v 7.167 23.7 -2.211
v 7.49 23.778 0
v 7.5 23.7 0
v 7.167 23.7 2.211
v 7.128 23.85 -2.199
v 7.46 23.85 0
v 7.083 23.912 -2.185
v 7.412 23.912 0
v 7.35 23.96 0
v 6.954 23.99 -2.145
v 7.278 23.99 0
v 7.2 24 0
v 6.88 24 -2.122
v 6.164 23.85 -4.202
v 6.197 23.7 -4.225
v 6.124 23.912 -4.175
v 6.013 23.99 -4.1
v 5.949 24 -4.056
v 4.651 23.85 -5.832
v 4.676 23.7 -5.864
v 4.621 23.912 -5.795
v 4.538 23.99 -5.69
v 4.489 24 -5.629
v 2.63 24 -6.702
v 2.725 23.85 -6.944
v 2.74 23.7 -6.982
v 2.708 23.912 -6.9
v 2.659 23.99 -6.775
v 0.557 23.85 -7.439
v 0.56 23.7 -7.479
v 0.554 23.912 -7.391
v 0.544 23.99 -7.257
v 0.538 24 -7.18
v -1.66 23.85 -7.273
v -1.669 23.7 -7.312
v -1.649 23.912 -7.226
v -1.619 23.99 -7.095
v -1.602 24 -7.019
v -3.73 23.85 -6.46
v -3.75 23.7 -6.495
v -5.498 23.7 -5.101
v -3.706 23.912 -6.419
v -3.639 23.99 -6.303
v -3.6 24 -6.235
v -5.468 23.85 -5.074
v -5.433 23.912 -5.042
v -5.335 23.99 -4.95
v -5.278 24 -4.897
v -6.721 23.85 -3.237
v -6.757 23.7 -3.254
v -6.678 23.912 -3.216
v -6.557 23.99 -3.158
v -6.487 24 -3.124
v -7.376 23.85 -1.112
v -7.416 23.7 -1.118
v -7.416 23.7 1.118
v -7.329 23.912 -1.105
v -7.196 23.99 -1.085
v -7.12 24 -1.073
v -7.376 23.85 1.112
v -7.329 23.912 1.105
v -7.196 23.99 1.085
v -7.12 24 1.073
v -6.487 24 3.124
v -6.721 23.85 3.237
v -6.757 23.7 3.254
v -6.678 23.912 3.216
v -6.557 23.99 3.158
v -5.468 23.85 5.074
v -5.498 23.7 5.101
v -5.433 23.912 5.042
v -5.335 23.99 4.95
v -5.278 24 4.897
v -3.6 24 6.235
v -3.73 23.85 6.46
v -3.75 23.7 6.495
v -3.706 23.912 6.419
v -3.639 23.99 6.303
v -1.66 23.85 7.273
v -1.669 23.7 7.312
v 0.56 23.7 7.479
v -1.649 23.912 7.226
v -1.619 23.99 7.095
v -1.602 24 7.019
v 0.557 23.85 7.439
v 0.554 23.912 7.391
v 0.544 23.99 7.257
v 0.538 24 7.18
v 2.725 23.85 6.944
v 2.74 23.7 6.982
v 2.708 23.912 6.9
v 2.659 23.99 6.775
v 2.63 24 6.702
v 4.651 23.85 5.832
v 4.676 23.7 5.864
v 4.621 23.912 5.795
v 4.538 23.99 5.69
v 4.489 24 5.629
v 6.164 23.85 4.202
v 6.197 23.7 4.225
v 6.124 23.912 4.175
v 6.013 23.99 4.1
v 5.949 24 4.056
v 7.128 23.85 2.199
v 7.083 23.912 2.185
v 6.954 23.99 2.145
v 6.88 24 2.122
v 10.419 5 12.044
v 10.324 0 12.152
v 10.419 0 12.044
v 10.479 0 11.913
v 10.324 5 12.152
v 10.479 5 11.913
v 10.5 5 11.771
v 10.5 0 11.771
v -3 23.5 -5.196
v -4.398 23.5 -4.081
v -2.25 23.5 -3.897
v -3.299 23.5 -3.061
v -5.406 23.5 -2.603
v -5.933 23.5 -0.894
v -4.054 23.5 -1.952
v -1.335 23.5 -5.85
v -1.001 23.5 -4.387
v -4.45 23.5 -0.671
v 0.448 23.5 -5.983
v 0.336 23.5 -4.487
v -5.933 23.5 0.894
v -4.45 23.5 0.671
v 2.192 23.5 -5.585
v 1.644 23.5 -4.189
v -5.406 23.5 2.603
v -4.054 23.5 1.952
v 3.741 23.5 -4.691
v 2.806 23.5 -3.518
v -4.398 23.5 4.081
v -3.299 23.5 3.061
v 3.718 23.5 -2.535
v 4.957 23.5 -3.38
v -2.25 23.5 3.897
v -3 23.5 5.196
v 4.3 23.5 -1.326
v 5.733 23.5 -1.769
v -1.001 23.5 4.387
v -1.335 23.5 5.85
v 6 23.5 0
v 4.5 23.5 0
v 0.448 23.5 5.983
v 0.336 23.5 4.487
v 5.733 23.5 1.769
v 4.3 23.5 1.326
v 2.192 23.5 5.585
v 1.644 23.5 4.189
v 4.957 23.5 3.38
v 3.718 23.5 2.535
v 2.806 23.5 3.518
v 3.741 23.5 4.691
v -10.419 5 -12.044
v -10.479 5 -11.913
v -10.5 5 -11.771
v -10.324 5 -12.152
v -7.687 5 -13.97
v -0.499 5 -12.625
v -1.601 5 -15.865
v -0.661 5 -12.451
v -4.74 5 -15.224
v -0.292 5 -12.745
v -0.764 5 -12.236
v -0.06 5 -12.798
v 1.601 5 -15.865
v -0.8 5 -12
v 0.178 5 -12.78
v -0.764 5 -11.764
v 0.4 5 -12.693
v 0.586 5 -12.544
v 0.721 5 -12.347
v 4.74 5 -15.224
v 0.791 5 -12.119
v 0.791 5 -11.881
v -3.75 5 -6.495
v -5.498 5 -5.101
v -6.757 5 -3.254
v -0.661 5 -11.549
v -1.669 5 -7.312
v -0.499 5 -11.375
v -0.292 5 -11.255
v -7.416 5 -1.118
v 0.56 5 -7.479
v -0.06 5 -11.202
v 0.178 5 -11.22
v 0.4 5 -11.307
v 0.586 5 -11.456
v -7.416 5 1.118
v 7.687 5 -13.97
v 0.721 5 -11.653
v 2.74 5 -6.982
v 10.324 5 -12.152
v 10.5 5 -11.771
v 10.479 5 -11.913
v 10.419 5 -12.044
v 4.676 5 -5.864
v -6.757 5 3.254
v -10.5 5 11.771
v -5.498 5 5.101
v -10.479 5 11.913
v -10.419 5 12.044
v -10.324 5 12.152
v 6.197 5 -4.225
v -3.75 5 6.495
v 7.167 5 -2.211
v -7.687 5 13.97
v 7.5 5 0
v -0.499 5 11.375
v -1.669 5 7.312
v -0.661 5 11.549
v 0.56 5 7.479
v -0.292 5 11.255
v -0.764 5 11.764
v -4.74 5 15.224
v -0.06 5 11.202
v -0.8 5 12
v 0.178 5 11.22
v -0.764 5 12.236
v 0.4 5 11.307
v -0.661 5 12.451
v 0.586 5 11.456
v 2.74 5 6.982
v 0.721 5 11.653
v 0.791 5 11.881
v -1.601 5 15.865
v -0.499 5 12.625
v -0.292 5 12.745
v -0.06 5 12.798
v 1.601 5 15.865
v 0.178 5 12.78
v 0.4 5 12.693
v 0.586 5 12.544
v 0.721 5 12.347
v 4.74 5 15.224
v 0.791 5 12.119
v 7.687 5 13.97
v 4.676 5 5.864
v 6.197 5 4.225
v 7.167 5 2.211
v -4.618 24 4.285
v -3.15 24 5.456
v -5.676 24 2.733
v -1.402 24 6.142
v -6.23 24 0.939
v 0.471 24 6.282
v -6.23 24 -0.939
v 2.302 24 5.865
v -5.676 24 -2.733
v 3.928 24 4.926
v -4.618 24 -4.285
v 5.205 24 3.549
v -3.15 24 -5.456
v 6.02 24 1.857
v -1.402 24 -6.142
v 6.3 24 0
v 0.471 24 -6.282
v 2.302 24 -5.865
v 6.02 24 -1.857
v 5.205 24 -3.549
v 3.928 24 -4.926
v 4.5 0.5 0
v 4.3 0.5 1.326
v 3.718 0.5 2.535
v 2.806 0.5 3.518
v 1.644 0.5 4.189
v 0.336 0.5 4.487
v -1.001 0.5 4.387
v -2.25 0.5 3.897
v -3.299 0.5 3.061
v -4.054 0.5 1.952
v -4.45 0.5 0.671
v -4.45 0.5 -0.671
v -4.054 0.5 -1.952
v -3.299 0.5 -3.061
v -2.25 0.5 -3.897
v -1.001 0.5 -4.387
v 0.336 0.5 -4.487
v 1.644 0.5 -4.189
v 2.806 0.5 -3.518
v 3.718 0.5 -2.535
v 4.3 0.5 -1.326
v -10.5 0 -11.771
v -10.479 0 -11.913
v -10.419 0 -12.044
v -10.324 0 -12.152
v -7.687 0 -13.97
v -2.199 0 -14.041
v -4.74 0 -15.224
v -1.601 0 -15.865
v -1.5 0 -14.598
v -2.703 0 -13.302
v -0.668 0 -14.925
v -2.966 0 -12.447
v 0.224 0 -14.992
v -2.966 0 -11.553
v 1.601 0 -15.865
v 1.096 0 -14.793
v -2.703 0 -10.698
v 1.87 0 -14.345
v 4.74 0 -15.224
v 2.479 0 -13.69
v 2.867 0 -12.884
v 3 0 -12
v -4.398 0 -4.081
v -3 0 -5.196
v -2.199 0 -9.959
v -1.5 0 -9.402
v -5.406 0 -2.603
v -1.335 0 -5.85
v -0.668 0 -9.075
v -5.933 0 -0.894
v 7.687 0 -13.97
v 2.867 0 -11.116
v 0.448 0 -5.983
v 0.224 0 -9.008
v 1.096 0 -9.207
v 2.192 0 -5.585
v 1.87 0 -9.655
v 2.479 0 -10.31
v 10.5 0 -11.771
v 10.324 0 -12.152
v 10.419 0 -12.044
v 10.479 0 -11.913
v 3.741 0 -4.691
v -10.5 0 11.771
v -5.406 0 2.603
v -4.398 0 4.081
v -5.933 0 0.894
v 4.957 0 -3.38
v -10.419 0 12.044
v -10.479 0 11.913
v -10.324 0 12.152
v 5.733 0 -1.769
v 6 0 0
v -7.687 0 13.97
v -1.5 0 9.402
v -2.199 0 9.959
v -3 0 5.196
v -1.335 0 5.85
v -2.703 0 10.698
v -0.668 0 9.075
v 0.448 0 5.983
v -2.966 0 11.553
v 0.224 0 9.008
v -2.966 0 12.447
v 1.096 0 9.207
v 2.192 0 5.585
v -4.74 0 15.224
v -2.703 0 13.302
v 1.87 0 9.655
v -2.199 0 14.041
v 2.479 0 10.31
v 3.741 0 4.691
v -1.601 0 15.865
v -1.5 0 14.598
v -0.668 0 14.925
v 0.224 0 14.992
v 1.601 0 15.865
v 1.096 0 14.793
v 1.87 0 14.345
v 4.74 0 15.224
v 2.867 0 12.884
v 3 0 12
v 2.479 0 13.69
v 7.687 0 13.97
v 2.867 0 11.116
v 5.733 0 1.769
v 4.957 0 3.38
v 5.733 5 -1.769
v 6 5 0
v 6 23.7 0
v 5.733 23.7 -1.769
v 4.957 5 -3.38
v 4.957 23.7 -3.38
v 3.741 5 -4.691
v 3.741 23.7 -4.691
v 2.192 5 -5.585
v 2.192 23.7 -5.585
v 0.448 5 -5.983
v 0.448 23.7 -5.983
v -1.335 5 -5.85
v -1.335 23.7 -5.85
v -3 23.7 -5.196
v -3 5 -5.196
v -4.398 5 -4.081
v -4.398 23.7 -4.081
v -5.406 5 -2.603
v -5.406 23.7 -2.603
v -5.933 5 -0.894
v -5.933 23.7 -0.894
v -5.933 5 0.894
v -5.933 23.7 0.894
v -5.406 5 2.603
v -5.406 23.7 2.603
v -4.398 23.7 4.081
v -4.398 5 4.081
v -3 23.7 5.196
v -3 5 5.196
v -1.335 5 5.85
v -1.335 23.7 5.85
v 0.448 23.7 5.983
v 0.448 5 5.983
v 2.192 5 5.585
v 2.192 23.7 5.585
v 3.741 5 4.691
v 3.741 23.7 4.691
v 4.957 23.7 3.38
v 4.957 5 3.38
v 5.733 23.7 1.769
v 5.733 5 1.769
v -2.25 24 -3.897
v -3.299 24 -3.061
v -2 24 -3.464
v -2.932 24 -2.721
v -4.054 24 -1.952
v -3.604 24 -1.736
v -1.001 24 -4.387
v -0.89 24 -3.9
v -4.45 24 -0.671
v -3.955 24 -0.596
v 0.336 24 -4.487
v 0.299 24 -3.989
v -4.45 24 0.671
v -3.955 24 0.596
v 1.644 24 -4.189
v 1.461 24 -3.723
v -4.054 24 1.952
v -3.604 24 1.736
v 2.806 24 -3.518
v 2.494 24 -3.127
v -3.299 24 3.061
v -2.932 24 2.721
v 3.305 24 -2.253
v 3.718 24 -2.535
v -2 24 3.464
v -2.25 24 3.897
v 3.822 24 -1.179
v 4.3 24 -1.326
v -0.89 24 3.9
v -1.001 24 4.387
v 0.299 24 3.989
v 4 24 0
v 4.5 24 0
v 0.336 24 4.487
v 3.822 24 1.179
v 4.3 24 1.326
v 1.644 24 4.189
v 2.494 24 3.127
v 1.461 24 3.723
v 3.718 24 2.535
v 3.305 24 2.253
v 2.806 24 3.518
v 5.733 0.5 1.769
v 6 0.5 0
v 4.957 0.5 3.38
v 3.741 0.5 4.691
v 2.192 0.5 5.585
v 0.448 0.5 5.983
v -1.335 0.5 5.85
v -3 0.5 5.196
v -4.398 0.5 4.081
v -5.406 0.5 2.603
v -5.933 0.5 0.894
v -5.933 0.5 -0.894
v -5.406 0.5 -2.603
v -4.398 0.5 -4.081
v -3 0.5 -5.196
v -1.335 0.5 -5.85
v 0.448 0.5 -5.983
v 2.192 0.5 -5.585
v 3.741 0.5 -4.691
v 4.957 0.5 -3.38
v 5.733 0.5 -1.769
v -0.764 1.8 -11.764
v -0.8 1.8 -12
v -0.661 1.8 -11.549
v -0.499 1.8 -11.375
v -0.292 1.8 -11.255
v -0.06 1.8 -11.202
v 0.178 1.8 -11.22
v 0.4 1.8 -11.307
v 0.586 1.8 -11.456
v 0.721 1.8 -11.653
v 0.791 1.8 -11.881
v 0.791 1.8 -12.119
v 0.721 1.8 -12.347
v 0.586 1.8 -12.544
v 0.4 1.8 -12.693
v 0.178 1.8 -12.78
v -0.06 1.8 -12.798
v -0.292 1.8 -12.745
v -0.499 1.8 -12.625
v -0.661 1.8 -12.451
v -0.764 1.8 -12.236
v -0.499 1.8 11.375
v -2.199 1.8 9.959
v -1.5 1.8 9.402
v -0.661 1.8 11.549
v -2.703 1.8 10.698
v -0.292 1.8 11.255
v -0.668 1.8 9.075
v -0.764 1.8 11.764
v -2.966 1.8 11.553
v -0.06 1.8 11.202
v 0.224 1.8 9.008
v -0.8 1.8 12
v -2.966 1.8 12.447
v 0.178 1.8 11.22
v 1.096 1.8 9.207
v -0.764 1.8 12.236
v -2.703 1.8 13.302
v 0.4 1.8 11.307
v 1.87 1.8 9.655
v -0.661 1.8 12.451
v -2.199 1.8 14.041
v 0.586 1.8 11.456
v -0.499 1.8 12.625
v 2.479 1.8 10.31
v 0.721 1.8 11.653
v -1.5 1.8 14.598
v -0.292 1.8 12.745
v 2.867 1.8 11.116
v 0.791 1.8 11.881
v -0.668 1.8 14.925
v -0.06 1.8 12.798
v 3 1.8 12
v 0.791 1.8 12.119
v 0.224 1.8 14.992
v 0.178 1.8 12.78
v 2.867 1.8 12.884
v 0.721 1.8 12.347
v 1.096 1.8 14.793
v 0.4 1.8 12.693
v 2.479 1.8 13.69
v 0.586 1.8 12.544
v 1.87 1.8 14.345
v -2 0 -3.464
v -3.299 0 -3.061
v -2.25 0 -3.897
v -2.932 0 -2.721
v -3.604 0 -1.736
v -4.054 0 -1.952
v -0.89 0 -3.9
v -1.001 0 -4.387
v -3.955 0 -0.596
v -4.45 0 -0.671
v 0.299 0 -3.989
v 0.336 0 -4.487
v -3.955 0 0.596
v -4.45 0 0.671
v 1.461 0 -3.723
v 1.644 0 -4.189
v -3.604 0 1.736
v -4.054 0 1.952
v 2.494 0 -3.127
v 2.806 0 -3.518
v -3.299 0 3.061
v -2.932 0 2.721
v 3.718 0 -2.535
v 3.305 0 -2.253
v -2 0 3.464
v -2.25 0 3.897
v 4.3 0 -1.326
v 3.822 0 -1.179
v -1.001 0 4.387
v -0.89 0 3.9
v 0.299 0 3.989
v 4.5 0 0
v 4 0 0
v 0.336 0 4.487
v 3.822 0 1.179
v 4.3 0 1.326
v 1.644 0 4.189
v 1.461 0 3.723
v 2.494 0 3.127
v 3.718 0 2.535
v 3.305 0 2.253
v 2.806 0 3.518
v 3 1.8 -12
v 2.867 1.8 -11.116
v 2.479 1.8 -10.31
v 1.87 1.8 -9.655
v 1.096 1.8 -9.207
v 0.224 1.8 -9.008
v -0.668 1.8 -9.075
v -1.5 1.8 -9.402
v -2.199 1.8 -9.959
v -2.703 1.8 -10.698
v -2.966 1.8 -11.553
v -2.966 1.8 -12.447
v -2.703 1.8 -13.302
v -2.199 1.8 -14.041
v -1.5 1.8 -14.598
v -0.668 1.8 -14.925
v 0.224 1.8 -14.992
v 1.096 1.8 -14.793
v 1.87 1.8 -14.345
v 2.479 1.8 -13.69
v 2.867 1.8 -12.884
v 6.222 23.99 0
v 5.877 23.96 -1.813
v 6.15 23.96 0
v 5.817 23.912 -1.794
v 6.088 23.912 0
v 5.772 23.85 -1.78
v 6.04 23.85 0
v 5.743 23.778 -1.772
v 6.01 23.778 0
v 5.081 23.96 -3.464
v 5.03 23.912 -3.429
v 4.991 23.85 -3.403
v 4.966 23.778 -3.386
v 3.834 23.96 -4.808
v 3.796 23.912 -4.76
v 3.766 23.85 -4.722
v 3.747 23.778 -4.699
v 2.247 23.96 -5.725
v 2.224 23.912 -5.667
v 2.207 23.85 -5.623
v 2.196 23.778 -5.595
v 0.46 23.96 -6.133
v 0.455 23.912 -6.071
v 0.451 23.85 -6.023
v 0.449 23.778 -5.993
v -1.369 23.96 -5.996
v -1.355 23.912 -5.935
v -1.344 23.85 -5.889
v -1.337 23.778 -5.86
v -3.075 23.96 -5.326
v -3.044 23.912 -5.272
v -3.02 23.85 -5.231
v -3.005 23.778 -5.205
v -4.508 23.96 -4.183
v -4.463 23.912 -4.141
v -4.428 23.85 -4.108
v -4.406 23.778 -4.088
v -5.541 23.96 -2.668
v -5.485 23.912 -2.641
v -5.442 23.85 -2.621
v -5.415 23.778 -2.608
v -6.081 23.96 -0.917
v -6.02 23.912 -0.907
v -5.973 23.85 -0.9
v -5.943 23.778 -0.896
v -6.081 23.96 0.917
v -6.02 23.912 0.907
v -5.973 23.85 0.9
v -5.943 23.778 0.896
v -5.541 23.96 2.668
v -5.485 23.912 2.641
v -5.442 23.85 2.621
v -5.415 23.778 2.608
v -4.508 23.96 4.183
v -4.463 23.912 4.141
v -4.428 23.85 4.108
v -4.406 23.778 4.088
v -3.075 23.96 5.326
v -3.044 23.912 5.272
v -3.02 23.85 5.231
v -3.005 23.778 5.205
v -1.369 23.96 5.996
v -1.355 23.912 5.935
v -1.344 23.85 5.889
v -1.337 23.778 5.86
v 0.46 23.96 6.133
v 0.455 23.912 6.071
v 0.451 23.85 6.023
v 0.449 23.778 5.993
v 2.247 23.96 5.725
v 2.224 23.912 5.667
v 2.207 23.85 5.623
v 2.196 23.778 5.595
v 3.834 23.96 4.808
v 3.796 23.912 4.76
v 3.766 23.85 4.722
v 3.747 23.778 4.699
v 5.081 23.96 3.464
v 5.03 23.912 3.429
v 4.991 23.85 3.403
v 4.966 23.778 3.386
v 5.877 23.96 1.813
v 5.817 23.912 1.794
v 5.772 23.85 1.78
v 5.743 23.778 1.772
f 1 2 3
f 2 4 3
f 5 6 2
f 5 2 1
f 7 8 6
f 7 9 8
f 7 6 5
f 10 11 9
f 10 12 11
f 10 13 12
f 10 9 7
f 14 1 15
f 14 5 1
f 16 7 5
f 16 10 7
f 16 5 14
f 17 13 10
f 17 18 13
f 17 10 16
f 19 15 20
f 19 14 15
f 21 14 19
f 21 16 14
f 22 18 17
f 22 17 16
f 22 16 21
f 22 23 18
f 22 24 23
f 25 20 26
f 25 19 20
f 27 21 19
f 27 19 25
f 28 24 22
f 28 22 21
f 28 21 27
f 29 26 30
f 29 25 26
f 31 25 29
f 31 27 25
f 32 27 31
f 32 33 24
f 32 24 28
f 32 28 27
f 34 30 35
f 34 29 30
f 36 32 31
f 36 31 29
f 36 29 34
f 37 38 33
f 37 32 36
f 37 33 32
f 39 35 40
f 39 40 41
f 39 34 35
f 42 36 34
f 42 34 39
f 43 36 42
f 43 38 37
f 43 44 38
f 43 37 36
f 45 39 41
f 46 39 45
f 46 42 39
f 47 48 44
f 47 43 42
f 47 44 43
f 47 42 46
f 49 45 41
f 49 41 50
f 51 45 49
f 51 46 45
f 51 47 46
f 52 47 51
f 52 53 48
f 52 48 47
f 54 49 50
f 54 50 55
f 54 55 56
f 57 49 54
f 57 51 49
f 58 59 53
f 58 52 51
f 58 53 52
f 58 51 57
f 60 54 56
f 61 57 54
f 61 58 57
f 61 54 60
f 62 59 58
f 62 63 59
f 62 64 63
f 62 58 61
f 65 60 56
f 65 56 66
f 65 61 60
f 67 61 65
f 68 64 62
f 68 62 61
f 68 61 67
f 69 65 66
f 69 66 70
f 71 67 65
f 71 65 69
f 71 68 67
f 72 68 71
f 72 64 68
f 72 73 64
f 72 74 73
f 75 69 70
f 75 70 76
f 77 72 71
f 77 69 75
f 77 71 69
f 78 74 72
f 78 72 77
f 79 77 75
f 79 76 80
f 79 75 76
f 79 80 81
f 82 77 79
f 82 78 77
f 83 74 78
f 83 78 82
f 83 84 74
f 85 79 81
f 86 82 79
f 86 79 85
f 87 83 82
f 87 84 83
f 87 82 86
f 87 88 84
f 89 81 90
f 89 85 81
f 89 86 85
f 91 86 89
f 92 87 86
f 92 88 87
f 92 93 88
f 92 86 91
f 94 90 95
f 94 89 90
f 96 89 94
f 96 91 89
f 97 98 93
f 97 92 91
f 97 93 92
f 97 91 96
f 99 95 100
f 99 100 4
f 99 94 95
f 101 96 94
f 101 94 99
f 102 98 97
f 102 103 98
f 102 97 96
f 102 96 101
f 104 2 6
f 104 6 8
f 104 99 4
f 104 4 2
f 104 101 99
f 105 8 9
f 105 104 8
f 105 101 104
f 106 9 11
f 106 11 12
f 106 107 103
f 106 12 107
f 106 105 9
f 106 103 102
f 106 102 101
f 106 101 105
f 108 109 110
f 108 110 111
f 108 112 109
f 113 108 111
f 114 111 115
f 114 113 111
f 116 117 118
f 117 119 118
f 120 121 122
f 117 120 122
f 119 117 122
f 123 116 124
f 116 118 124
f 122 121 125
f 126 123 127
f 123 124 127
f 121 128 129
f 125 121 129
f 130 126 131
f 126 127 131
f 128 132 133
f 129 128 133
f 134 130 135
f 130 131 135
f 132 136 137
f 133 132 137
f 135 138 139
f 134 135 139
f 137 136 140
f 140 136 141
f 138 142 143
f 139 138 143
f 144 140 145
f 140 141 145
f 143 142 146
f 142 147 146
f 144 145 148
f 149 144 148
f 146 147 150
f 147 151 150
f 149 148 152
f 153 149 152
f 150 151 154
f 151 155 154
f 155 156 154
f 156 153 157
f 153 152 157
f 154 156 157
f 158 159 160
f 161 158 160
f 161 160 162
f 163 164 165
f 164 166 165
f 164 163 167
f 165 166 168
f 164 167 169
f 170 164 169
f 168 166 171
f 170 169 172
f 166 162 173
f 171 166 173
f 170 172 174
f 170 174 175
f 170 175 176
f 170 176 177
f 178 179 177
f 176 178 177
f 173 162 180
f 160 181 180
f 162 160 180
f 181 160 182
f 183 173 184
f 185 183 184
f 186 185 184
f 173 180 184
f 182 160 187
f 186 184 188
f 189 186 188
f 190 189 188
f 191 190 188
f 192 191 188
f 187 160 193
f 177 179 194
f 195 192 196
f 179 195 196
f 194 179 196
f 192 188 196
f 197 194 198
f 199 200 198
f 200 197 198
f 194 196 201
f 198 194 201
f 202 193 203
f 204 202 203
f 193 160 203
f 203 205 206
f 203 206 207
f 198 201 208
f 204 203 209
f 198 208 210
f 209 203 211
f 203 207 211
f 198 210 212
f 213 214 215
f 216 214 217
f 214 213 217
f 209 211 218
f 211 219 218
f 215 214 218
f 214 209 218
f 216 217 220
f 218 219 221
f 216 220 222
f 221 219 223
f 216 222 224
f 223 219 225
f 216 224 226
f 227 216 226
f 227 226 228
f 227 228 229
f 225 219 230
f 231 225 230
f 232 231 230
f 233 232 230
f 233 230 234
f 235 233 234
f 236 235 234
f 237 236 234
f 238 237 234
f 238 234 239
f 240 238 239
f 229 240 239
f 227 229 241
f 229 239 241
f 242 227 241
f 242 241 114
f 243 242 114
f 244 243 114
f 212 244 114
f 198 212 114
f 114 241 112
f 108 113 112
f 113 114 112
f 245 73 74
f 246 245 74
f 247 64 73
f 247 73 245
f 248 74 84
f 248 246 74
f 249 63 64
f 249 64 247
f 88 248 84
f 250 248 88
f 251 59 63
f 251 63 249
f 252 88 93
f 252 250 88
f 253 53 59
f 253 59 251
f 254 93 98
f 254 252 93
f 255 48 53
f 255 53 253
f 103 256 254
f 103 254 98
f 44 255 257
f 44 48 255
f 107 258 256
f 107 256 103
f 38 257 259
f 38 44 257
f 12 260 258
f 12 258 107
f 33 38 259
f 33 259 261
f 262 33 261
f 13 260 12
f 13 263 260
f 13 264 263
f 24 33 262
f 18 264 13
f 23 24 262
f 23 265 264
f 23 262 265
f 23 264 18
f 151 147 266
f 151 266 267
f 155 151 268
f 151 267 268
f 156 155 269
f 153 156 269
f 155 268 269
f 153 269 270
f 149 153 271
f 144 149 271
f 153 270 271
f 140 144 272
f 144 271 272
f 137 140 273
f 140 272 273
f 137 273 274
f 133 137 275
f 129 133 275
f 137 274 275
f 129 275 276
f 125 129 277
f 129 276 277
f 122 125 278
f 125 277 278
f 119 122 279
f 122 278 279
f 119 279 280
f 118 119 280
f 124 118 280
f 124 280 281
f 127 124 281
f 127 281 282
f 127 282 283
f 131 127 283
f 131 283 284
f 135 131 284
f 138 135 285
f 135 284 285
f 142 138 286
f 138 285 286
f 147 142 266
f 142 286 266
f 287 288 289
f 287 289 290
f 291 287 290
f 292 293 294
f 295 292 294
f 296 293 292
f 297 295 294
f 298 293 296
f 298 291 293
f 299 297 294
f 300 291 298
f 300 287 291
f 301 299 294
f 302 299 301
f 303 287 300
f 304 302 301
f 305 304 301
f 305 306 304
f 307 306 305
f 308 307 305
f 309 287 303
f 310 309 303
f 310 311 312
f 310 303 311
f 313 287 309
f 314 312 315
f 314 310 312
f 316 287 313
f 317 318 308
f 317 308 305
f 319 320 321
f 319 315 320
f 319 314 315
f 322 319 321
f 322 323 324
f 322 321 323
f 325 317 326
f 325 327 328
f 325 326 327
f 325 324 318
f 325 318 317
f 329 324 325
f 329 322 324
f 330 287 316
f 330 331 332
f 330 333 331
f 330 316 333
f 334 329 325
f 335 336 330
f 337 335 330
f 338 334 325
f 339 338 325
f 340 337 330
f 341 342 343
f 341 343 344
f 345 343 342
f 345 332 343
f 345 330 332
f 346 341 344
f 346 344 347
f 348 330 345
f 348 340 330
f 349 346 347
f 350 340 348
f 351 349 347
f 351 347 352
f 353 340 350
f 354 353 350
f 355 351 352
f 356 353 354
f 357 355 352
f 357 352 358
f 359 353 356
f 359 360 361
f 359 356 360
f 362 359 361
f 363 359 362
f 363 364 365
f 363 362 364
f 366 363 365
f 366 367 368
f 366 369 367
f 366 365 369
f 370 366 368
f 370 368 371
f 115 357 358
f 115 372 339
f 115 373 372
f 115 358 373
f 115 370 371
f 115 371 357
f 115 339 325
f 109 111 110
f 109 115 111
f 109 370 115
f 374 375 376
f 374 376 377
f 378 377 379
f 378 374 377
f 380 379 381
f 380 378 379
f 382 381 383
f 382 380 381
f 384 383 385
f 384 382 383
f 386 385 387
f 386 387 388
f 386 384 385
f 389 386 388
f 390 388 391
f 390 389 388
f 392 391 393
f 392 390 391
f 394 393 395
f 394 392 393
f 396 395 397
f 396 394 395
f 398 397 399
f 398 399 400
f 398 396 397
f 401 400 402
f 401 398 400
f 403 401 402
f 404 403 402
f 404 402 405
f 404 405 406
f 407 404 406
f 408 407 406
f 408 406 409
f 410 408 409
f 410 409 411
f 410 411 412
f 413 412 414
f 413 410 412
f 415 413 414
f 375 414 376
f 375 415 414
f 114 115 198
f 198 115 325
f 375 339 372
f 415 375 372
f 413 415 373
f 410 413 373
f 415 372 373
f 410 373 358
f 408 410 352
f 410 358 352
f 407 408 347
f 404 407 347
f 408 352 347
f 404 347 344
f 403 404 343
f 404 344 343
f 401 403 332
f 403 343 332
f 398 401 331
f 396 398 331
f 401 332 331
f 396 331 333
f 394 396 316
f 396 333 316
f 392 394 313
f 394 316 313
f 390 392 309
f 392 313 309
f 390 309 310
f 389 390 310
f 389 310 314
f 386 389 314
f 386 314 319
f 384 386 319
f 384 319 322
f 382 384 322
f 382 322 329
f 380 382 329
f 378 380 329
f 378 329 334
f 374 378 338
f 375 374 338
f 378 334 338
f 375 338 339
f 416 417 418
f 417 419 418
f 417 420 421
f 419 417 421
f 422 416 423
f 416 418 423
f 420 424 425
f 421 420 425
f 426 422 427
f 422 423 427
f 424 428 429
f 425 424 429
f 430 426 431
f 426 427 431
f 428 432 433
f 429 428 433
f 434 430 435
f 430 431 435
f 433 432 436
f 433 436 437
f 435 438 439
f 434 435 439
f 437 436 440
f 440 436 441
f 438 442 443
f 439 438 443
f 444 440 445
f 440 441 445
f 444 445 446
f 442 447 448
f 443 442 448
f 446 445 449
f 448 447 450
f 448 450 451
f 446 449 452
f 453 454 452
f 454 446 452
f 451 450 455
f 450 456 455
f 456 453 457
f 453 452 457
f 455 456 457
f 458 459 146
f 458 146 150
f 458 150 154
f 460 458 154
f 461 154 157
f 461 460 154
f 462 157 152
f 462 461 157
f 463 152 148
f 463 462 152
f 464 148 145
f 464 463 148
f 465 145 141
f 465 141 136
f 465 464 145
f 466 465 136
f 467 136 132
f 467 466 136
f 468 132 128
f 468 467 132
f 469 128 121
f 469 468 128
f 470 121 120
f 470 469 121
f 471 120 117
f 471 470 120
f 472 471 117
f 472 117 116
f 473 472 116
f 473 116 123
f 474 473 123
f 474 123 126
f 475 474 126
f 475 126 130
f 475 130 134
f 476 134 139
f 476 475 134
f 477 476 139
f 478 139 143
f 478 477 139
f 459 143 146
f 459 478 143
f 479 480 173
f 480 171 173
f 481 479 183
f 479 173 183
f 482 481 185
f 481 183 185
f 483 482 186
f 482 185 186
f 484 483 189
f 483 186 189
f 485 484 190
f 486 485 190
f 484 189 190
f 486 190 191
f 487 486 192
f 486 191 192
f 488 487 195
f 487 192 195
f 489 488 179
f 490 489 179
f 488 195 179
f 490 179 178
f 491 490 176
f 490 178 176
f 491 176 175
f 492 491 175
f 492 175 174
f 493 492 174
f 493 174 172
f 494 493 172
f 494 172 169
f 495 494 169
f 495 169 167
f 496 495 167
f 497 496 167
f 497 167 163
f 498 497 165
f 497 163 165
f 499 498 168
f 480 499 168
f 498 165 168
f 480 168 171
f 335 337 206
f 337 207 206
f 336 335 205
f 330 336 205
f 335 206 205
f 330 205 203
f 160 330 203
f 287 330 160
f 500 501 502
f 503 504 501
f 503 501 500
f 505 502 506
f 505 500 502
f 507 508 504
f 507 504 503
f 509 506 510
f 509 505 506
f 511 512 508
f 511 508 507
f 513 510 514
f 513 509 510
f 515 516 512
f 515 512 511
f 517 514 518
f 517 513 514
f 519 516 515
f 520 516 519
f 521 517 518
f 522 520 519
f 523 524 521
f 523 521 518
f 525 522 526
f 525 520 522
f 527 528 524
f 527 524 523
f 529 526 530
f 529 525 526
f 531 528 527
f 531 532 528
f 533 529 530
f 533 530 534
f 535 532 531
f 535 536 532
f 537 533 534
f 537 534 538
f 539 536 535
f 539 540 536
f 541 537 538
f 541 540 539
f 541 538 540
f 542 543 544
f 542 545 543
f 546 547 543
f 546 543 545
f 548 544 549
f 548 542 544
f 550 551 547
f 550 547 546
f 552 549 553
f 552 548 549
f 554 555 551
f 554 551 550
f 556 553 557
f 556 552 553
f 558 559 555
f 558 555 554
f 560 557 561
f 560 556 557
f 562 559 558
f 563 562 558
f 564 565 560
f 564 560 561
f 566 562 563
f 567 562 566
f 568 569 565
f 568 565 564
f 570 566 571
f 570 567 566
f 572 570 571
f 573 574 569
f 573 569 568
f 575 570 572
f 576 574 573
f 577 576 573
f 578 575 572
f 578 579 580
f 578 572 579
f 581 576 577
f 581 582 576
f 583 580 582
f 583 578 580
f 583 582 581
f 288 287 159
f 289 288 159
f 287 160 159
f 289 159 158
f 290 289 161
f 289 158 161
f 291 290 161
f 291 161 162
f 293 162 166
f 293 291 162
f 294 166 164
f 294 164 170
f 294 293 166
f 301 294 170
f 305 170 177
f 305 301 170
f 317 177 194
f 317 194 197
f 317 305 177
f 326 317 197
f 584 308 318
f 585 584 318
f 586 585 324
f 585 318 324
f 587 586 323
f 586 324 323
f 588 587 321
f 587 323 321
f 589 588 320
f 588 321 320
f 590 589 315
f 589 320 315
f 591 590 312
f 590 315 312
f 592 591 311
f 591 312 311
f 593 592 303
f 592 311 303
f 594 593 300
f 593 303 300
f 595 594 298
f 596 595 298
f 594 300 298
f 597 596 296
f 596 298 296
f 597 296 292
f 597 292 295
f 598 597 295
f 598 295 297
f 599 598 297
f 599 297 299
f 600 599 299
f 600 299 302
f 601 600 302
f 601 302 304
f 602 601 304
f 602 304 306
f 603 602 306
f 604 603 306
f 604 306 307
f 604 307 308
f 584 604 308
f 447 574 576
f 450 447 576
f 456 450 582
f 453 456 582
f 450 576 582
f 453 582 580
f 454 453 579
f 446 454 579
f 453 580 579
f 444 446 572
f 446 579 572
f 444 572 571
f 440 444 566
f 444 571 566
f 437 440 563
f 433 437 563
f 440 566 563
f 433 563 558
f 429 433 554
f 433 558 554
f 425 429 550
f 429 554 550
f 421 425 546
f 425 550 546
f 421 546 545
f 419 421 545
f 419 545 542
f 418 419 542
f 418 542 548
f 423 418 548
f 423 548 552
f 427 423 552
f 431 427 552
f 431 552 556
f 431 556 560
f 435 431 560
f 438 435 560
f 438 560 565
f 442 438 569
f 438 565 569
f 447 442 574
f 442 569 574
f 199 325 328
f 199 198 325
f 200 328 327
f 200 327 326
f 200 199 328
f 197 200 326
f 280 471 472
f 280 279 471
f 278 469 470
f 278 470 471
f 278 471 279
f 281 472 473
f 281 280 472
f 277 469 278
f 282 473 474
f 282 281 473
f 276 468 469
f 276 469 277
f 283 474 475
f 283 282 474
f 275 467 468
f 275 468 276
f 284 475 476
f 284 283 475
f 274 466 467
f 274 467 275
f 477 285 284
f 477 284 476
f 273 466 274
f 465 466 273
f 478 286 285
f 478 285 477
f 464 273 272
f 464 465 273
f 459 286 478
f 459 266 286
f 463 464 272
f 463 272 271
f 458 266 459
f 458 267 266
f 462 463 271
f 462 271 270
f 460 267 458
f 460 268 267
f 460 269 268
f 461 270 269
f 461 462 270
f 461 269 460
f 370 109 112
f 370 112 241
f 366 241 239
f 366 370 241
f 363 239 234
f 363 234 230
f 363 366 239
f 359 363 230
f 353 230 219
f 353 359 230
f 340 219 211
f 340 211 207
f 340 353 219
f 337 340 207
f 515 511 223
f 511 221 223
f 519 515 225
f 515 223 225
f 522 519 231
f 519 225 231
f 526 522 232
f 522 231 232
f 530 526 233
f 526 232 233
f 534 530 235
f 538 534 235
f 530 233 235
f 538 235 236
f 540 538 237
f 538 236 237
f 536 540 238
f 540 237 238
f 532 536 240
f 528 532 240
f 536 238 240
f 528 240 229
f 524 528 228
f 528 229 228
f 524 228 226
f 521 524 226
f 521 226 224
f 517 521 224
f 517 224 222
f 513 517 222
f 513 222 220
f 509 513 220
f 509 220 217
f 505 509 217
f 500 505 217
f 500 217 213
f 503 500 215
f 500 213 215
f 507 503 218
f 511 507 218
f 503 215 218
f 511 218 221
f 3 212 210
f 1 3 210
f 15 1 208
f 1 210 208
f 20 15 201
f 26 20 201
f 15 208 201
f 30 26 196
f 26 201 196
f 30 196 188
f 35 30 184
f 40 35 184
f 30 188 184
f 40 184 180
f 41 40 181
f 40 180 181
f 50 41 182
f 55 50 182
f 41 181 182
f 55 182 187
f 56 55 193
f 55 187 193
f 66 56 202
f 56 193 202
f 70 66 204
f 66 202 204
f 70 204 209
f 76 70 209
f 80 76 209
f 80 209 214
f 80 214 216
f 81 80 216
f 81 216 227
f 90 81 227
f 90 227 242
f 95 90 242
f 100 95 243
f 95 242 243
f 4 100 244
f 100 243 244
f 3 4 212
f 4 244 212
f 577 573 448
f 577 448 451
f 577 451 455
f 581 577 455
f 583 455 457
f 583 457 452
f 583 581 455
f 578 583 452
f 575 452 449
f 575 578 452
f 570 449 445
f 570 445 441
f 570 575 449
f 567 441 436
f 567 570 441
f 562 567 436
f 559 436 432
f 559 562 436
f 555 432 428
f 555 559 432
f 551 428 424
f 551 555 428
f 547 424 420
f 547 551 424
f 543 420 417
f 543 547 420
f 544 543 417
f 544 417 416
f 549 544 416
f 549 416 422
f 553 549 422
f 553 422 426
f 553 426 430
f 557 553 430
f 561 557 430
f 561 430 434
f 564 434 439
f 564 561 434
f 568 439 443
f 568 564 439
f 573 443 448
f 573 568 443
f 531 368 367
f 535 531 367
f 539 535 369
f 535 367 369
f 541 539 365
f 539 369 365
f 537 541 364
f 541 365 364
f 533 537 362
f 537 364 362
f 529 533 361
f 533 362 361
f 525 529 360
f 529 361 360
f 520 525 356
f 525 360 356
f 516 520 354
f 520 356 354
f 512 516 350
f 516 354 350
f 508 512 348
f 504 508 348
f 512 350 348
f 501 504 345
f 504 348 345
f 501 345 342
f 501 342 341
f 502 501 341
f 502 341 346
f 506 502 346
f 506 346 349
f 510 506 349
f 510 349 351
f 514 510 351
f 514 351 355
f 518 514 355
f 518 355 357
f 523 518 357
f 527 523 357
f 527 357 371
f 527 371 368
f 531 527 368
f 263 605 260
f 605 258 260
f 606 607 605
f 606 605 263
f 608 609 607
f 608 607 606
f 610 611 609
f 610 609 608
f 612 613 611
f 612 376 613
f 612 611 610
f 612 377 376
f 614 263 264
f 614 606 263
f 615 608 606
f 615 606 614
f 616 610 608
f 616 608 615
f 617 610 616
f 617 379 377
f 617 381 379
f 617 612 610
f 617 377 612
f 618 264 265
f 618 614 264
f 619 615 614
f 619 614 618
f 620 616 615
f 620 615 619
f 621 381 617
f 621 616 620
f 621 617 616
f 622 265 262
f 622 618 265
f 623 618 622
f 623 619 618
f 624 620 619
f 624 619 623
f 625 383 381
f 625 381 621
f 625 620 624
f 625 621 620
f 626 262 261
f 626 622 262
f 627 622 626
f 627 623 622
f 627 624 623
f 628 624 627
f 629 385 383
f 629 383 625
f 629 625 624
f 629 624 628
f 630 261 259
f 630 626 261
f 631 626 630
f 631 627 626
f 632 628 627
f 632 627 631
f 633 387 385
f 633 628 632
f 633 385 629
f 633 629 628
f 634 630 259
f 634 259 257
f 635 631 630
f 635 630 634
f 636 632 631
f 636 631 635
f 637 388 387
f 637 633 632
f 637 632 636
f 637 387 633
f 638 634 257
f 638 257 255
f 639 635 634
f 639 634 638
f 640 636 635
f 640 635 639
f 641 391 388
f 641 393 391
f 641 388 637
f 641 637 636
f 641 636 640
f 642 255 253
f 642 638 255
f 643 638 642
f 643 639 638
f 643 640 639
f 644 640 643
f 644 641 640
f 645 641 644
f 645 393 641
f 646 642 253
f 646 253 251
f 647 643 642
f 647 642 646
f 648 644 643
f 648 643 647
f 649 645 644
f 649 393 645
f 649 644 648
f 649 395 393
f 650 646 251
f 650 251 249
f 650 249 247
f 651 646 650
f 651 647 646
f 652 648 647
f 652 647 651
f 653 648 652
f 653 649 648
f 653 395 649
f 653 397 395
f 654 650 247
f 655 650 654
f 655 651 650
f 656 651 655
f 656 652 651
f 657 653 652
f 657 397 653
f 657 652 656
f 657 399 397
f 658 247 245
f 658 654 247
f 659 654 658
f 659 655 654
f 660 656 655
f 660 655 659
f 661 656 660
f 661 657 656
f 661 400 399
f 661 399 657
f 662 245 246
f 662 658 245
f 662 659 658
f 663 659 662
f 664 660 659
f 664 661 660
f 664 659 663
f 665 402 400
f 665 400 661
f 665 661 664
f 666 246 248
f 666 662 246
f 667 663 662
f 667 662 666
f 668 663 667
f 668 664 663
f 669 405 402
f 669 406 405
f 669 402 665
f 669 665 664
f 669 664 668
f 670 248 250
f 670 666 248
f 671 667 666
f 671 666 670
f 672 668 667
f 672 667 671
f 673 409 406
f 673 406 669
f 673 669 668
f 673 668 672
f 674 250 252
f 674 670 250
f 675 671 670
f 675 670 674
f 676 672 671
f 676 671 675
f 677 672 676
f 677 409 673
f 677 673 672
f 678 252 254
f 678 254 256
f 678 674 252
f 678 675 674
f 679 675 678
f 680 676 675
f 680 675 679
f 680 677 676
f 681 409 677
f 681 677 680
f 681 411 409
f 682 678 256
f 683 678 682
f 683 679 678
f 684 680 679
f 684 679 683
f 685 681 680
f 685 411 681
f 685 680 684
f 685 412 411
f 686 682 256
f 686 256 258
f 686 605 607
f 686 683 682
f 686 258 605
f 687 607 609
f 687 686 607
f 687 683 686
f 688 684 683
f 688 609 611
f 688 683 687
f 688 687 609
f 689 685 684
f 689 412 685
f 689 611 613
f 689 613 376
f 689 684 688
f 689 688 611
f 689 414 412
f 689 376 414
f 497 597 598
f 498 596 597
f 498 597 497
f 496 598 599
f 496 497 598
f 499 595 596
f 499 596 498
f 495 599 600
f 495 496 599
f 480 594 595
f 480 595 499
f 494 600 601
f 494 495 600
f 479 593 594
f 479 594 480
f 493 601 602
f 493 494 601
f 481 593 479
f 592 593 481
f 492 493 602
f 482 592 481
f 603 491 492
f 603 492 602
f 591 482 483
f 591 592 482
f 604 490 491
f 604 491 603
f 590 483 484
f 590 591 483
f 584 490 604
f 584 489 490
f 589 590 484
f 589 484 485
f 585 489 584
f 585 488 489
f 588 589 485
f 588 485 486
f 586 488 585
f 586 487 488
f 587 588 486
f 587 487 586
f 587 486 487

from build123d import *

# Parameters (mm, degrees)
SKETCH_R         = 6
PAD_DEPTH        = 5
HOLE_D           = 1.6
HOLE_CBORE_D     = 6
HOLE_CBORE_DEPTH = 1.8
SKETCH002_R      = 7.5
SKETCH002_R_2    = 6
PAD001_DEPTH     = 19
FILLET_R         = 0.5
FILLET001_R      = 0.3
SKETCH003_R      = 6
SKETCH003_R_2    = 4.5
PAD002_DEPTH     = 23
SKETCH004_R      = 4.5
SKETCH004_R_2    = 4
PAD003_DEPTH     = 24


with BuildPart() as body:
    # Sketch → Pad (new body)
    with BuildSketch(Plane.XZ):
        with BuildLine():
            ThreePointArc((10.5, 12), (0, 15.945219), (-10.5, 12))
            Line((-10.5, 12), (-10.5, -12))
            ThreePointArc((-10.5, -12), (0, -15.945219), (10.5, -12))
            Line((10.5, 12), (10.5, -12))
        make_face()
        Circle(SKETCH_R, mode=Mode.SUBTRACT)
    extrude(amount=-PAD_DEPTH)

    # Hole (through all)
    with Locations(Plane.XZ):
        with Locations((0, 12), (0, -12)):
            CounterBoreHole(HOLE_D / 2, HOLE_CBORE_D / 2, HOLE_CBORE_DEPTH)

    # Sketch002 (on Face5 of Hole) → Pad001 (join)
    with BuildSketch(Plane(origin=(0, 5, 0), x_dir=(1, 0, 0), z_dir=(0, 1, 0))):
        Circle(SKETCH002_R)
        Circle(SKETCH002_R_2, mode=Mode.SUBTRACT)
    extrude(amount=PAD001_DEPTH)

    # Fillet
    fillet_edges = [body.edges().sort_by_distance(p)[0] for p in [
        (10.5, 2.5, -12),
        (10.5, 2.5, 12),
        (-10.5, 2.5, 12),
        (-10.5, 2.5, -12),
    ]]
    fillet(fillet_edges, radius=FILLET_R)

    # Fillet001
    fillet001_edges = [body.edges().sort_by_distance(p)[0] for p in [
        (-7.5, 24, 0),
        (-6, 24, 0),
    ]]
    fillet(fillet001_edges, radius=FILLET001_R)


with BuildPart() as body001:
    # Sketch003 → Pad002 (new body)
    with BuildSketch(Plane.XZ):
        Circle(SKETCH003_R)
        Circle(SKETCH003_R_2, mode=Mode.SUBTRACT)
    extrude(amount=-PAD002_DEPTH)


with BuildPart() as body001_1:
    # Body001 placement: moved
    add(body001.part.moved(Location((0, 0.5, 0))))


with BuildPart() as body002:
    # Sketch004 → Pad003 (new body)
    with BuildSketch(Plane.XZ):
        Circle(SKETCH004_R)
        Circle(SKETCH004_R_2, mode=Mode.SUBTRACT)
    extrude(amount=-PAD003_DEPTH)


solid = Compound([body.part, body001_1.part, body002.part])
